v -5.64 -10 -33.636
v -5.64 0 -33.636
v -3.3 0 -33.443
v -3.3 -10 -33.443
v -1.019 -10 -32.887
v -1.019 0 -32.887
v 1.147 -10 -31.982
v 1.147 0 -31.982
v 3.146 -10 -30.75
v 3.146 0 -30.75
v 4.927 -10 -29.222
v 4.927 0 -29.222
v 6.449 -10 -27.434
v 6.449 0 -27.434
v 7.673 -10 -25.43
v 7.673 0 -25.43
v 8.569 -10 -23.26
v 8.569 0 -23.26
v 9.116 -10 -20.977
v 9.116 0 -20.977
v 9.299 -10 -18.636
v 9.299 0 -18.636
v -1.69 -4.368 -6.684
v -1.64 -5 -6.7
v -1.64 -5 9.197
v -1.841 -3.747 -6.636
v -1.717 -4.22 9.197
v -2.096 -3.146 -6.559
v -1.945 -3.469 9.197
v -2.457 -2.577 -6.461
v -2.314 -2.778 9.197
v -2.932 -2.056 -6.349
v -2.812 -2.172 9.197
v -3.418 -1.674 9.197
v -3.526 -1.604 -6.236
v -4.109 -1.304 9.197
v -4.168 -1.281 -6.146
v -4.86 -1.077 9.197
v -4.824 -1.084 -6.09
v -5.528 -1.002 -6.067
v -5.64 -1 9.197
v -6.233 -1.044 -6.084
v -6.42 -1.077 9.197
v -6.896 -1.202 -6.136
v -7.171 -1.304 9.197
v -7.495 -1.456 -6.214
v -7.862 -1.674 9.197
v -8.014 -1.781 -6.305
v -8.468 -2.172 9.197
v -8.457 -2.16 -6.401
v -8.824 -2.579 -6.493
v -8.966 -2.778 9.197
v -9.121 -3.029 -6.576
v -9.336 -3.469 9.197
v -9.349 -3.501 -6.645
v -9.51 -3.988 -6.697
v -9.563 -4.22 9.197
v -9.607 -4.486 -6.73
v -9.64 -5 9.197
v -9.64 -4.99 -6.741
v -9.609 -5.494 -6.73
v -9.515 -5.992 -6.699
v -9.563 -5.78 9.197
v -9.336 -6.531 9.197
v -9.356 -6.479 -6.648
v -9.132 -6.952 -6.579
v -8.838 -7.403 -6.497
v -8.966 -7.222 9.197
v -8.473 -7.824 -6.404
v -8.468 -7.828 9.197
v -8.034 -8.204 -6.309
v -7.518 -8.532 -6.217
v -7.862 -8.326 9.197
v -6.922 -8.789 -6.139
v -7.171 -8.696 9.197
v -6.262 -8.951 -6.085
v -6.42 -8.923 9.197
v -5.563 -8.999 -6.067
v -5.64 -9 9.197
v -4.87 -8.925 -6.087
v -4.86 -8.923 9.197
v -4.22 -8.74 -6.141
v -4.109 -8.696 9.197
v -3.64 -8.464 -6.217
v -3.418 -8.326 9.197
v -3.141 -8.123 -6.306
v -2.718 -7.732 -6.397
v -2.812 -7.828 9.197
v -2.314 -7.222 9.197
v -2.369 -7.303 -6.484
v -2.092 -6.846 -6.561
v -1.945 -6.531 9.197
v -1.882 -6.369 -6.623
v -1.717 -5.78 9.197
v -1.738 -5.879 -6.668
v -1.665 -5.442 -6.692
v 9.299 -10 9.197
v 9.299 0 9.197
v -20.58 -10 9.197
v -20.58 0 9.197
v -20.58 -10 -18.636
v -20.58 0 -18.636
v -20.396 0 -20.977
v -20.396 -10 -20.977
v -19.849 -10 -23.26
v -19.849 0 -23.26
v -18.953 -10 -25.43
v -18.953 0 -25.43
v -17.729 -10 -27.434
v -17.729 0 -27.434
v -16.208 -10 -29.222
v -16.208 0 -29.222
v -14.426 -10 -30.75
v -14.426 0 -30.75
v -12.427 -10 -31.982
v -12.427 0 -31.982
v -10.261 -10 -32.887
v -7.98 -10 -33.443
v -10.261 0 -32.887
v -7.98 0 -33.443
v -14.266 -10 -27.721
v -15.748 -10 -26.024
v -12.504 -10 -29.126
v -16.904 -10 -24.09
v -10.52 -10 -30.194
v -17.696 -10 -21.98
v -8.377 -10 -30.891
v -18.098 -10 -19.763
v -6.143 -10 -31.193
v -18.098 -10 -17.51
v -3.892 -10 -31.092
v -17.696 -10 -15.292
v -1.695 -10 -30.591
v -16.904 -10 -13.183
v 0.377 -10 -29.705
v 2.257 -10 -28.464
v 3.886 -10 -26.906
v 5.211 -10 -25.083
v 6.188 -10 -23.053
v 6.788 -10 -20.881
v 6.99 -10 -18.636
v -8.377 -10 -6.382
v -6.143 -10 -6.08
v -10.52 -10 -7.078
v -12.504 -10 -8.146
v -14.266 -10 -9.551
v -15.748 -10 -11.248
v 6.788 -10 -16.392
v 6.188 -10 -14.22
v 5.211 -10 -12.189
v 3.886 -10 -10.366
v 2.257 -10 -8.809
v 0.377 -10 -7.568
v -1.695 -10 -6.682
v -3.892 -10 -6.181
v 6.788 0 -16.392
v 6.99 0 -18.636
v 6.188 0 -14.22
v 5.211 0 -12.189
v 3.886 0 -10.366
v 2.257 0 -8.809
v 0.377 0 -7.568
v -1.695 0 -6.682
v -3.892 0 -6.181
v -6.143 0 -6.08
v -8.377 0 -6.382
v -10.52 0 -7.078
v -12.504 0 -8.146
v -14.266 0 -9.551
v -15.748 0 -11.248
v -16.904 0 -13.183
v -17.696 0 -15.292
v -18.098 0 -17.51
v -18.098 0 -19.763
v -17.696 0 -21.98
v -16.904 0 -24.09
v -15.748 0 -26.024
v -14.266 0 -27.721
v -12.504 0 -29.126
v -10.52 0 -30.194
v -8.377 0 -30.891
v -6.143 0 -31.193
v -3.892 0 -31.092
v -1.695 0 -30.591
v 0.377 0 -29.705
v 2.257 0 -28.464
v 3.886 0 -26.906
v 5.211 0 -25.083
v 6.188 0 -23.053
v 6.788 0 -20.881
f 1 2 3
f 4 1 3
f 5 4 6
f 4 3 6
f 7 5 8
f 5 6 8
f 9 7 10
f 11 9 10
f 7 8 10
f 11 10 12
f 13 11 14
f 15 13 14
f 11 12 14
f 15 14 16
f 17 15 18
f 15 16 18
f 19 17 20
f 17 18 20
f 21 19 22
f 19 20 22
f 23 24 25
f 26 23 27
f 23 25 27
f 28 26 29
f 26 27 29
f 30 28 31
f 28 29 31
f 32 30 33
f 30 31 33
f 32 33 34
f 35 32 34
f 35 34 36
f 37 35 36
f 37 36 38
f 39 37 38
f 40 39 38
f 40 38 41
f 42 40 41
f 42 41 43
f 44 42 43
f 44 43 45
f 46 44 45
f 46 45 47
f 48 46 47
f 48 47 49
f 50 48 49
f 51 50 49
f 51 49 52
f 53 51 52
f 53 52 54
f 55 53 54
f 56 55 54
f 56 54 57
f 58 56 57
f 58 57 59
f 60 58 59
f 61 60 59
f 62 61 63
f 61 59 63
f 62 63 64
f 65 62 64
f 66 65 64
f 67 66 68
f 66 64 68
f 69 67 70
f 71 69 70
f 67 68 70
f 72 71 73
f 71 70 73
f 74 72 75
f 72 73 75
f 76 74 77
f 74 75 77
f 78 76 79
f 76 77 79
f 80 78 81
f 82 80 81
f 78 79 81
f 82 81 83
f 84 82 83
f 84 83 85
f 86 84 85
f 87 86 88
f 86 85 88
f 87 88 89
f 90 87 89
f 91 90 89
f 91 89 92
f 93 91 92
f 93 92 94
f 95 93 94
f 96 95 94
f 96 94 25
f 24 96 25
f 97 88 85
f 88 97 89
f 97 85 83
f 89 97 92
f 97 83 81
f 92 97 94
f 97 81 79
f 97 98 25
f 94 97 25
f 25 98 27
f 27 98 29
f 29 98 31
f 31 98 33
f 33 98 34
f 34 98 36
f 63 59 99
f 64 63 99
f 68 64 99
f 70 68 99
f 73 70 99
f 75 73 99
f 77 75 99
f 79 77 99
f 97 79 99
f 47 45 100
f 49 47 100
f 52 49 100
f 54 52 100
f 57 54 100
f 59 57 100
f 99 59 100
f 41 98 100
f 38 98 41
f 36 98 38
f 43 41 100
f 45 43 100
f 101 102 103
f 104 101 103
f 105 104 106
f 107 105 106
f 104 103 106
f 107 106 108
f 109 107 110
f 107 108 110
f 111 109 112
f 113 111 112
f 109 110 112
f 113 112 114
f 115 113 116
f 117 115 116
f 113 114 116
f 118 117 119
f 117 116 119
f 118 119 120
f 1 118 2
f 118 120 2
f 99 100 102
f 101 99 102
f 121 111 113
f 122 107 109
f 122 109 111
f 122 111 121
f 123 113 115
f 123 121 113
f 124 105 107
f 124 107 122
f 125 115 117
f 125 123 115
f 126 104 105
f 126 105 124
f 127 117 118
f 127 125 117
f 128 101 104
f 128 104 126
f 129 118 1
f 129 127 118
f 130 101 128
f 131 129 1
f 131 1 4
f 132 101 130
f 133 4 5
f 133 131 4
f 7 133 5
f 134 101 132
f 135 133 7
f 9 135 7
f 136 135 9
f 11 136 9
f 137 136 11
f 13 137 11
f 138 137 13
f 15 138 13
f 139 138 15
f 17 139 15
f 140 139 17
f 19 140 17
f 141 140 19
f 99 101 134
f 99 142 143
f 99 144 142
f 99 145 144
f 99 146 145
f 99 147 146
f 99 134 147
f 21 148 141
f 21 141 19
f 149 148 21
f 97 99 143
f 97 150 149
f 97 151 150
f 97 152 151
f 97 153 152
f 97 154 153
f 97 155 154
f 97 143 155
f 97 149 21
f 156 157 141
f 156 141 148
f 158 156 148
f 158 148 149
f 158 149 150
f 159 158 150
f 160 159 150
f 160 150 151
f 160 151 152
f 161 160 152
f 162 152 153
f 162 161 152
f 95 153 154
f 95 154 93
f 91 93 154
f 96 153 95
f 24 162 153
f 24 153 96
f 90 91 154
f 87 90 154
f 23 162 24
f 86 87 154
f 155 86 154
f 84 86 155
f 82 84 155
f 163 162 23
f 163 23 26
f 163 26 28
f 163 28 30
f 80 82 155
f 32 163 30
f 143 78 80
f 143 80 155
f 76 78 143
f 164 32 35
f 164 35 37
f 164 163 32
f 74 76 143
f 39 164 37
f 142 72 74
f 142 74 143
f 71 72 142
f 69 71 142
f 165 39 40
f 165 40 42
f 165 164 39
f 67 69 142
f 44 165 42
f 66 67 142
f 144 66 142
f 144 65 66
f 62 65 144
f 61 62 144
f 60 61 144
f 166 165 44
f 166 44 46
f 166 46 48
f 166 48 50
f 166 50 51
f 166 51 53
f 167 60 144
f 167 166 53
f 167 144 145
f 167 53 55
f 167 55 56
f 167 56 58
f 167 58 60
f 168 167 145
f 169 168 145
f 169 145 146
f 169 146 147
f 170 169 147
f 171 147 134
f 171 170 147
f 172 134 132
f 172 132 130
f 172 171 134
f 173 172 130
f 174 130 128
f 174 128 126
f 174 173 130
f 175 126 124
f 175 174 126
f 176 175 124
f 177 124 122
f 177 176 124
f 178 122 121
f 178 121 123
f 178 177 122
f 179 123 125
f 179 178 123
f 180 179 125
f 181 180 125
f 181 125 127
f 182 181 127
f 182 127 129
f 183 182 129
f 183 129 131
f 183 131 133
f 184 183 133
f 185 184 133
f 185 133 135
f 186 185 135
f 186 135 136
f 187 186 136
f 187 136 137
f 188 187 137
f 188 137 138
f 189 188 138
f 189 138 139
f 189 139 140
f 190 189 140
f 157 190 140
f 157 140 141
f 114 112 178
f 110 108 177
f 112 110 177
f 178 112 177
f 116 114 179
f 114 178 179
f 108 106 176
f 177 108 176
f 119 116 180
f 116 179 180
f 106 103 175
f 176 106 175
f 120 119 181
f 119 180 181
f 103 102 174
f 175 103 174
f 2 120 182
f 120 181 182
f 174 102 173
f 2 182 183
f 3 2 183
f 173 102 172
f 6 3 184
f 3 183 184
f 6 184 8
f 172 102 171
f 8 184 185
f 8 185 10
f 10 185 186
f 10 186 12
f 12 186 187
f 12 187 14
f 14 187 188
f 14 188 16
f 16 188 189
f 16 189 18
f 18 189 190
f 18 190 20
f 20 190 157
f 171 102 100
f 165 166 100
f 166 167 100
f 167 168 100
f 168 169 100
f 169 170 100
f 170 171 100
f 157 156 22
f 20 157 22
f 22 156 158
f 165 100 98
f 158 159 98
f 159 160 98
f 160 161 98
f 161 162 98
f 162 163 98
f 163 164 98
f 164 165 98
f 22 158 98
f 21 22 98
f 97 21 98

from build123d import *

# Parameters (mm, degrees)
F0_R     = 12.569468
F1_DEPTH = 10
F2_R     = 4
F3_DEPTH = 25


with BuildPart() as f1:
    # F0 (on Front) → F1 (new body)
    with BuildSketch(Plane.XZ):
        with BuildLine():
            Line((9.299427, -18.636342), (9.299427, 9.197386))
            Line((9.299427, 9.197386), (-20.579568, 9.197386))
            Line((-20.579568, 9.197386), (-20.579568, -18.636342))
            ThreePointArc((-20.579568, -18.636342), (-16.207539, -29.221531), (-5.64007, -33.63622))
            ThreePointArc((-5.64007, -33.63622), (4.927398, -29.221531), (9.299427, -18.636342))
        make_face()
        with Locations((-5.579568, -18.636342)):
            Circle(F0_R, mode=Mode.SUBTRACT)
    extrude(amount=F1_DEPTH)

    # F2 (on face) → F3 (cut)
    with BuildSketch(Plane.XY.offset(9.197386)):
        with Locations((-5.64007, -5)):
            Circle(F2_R)
    extrude(amount=-F3_DEPTH, mode=Mode.SUBTRACT)


solid = f1.part
